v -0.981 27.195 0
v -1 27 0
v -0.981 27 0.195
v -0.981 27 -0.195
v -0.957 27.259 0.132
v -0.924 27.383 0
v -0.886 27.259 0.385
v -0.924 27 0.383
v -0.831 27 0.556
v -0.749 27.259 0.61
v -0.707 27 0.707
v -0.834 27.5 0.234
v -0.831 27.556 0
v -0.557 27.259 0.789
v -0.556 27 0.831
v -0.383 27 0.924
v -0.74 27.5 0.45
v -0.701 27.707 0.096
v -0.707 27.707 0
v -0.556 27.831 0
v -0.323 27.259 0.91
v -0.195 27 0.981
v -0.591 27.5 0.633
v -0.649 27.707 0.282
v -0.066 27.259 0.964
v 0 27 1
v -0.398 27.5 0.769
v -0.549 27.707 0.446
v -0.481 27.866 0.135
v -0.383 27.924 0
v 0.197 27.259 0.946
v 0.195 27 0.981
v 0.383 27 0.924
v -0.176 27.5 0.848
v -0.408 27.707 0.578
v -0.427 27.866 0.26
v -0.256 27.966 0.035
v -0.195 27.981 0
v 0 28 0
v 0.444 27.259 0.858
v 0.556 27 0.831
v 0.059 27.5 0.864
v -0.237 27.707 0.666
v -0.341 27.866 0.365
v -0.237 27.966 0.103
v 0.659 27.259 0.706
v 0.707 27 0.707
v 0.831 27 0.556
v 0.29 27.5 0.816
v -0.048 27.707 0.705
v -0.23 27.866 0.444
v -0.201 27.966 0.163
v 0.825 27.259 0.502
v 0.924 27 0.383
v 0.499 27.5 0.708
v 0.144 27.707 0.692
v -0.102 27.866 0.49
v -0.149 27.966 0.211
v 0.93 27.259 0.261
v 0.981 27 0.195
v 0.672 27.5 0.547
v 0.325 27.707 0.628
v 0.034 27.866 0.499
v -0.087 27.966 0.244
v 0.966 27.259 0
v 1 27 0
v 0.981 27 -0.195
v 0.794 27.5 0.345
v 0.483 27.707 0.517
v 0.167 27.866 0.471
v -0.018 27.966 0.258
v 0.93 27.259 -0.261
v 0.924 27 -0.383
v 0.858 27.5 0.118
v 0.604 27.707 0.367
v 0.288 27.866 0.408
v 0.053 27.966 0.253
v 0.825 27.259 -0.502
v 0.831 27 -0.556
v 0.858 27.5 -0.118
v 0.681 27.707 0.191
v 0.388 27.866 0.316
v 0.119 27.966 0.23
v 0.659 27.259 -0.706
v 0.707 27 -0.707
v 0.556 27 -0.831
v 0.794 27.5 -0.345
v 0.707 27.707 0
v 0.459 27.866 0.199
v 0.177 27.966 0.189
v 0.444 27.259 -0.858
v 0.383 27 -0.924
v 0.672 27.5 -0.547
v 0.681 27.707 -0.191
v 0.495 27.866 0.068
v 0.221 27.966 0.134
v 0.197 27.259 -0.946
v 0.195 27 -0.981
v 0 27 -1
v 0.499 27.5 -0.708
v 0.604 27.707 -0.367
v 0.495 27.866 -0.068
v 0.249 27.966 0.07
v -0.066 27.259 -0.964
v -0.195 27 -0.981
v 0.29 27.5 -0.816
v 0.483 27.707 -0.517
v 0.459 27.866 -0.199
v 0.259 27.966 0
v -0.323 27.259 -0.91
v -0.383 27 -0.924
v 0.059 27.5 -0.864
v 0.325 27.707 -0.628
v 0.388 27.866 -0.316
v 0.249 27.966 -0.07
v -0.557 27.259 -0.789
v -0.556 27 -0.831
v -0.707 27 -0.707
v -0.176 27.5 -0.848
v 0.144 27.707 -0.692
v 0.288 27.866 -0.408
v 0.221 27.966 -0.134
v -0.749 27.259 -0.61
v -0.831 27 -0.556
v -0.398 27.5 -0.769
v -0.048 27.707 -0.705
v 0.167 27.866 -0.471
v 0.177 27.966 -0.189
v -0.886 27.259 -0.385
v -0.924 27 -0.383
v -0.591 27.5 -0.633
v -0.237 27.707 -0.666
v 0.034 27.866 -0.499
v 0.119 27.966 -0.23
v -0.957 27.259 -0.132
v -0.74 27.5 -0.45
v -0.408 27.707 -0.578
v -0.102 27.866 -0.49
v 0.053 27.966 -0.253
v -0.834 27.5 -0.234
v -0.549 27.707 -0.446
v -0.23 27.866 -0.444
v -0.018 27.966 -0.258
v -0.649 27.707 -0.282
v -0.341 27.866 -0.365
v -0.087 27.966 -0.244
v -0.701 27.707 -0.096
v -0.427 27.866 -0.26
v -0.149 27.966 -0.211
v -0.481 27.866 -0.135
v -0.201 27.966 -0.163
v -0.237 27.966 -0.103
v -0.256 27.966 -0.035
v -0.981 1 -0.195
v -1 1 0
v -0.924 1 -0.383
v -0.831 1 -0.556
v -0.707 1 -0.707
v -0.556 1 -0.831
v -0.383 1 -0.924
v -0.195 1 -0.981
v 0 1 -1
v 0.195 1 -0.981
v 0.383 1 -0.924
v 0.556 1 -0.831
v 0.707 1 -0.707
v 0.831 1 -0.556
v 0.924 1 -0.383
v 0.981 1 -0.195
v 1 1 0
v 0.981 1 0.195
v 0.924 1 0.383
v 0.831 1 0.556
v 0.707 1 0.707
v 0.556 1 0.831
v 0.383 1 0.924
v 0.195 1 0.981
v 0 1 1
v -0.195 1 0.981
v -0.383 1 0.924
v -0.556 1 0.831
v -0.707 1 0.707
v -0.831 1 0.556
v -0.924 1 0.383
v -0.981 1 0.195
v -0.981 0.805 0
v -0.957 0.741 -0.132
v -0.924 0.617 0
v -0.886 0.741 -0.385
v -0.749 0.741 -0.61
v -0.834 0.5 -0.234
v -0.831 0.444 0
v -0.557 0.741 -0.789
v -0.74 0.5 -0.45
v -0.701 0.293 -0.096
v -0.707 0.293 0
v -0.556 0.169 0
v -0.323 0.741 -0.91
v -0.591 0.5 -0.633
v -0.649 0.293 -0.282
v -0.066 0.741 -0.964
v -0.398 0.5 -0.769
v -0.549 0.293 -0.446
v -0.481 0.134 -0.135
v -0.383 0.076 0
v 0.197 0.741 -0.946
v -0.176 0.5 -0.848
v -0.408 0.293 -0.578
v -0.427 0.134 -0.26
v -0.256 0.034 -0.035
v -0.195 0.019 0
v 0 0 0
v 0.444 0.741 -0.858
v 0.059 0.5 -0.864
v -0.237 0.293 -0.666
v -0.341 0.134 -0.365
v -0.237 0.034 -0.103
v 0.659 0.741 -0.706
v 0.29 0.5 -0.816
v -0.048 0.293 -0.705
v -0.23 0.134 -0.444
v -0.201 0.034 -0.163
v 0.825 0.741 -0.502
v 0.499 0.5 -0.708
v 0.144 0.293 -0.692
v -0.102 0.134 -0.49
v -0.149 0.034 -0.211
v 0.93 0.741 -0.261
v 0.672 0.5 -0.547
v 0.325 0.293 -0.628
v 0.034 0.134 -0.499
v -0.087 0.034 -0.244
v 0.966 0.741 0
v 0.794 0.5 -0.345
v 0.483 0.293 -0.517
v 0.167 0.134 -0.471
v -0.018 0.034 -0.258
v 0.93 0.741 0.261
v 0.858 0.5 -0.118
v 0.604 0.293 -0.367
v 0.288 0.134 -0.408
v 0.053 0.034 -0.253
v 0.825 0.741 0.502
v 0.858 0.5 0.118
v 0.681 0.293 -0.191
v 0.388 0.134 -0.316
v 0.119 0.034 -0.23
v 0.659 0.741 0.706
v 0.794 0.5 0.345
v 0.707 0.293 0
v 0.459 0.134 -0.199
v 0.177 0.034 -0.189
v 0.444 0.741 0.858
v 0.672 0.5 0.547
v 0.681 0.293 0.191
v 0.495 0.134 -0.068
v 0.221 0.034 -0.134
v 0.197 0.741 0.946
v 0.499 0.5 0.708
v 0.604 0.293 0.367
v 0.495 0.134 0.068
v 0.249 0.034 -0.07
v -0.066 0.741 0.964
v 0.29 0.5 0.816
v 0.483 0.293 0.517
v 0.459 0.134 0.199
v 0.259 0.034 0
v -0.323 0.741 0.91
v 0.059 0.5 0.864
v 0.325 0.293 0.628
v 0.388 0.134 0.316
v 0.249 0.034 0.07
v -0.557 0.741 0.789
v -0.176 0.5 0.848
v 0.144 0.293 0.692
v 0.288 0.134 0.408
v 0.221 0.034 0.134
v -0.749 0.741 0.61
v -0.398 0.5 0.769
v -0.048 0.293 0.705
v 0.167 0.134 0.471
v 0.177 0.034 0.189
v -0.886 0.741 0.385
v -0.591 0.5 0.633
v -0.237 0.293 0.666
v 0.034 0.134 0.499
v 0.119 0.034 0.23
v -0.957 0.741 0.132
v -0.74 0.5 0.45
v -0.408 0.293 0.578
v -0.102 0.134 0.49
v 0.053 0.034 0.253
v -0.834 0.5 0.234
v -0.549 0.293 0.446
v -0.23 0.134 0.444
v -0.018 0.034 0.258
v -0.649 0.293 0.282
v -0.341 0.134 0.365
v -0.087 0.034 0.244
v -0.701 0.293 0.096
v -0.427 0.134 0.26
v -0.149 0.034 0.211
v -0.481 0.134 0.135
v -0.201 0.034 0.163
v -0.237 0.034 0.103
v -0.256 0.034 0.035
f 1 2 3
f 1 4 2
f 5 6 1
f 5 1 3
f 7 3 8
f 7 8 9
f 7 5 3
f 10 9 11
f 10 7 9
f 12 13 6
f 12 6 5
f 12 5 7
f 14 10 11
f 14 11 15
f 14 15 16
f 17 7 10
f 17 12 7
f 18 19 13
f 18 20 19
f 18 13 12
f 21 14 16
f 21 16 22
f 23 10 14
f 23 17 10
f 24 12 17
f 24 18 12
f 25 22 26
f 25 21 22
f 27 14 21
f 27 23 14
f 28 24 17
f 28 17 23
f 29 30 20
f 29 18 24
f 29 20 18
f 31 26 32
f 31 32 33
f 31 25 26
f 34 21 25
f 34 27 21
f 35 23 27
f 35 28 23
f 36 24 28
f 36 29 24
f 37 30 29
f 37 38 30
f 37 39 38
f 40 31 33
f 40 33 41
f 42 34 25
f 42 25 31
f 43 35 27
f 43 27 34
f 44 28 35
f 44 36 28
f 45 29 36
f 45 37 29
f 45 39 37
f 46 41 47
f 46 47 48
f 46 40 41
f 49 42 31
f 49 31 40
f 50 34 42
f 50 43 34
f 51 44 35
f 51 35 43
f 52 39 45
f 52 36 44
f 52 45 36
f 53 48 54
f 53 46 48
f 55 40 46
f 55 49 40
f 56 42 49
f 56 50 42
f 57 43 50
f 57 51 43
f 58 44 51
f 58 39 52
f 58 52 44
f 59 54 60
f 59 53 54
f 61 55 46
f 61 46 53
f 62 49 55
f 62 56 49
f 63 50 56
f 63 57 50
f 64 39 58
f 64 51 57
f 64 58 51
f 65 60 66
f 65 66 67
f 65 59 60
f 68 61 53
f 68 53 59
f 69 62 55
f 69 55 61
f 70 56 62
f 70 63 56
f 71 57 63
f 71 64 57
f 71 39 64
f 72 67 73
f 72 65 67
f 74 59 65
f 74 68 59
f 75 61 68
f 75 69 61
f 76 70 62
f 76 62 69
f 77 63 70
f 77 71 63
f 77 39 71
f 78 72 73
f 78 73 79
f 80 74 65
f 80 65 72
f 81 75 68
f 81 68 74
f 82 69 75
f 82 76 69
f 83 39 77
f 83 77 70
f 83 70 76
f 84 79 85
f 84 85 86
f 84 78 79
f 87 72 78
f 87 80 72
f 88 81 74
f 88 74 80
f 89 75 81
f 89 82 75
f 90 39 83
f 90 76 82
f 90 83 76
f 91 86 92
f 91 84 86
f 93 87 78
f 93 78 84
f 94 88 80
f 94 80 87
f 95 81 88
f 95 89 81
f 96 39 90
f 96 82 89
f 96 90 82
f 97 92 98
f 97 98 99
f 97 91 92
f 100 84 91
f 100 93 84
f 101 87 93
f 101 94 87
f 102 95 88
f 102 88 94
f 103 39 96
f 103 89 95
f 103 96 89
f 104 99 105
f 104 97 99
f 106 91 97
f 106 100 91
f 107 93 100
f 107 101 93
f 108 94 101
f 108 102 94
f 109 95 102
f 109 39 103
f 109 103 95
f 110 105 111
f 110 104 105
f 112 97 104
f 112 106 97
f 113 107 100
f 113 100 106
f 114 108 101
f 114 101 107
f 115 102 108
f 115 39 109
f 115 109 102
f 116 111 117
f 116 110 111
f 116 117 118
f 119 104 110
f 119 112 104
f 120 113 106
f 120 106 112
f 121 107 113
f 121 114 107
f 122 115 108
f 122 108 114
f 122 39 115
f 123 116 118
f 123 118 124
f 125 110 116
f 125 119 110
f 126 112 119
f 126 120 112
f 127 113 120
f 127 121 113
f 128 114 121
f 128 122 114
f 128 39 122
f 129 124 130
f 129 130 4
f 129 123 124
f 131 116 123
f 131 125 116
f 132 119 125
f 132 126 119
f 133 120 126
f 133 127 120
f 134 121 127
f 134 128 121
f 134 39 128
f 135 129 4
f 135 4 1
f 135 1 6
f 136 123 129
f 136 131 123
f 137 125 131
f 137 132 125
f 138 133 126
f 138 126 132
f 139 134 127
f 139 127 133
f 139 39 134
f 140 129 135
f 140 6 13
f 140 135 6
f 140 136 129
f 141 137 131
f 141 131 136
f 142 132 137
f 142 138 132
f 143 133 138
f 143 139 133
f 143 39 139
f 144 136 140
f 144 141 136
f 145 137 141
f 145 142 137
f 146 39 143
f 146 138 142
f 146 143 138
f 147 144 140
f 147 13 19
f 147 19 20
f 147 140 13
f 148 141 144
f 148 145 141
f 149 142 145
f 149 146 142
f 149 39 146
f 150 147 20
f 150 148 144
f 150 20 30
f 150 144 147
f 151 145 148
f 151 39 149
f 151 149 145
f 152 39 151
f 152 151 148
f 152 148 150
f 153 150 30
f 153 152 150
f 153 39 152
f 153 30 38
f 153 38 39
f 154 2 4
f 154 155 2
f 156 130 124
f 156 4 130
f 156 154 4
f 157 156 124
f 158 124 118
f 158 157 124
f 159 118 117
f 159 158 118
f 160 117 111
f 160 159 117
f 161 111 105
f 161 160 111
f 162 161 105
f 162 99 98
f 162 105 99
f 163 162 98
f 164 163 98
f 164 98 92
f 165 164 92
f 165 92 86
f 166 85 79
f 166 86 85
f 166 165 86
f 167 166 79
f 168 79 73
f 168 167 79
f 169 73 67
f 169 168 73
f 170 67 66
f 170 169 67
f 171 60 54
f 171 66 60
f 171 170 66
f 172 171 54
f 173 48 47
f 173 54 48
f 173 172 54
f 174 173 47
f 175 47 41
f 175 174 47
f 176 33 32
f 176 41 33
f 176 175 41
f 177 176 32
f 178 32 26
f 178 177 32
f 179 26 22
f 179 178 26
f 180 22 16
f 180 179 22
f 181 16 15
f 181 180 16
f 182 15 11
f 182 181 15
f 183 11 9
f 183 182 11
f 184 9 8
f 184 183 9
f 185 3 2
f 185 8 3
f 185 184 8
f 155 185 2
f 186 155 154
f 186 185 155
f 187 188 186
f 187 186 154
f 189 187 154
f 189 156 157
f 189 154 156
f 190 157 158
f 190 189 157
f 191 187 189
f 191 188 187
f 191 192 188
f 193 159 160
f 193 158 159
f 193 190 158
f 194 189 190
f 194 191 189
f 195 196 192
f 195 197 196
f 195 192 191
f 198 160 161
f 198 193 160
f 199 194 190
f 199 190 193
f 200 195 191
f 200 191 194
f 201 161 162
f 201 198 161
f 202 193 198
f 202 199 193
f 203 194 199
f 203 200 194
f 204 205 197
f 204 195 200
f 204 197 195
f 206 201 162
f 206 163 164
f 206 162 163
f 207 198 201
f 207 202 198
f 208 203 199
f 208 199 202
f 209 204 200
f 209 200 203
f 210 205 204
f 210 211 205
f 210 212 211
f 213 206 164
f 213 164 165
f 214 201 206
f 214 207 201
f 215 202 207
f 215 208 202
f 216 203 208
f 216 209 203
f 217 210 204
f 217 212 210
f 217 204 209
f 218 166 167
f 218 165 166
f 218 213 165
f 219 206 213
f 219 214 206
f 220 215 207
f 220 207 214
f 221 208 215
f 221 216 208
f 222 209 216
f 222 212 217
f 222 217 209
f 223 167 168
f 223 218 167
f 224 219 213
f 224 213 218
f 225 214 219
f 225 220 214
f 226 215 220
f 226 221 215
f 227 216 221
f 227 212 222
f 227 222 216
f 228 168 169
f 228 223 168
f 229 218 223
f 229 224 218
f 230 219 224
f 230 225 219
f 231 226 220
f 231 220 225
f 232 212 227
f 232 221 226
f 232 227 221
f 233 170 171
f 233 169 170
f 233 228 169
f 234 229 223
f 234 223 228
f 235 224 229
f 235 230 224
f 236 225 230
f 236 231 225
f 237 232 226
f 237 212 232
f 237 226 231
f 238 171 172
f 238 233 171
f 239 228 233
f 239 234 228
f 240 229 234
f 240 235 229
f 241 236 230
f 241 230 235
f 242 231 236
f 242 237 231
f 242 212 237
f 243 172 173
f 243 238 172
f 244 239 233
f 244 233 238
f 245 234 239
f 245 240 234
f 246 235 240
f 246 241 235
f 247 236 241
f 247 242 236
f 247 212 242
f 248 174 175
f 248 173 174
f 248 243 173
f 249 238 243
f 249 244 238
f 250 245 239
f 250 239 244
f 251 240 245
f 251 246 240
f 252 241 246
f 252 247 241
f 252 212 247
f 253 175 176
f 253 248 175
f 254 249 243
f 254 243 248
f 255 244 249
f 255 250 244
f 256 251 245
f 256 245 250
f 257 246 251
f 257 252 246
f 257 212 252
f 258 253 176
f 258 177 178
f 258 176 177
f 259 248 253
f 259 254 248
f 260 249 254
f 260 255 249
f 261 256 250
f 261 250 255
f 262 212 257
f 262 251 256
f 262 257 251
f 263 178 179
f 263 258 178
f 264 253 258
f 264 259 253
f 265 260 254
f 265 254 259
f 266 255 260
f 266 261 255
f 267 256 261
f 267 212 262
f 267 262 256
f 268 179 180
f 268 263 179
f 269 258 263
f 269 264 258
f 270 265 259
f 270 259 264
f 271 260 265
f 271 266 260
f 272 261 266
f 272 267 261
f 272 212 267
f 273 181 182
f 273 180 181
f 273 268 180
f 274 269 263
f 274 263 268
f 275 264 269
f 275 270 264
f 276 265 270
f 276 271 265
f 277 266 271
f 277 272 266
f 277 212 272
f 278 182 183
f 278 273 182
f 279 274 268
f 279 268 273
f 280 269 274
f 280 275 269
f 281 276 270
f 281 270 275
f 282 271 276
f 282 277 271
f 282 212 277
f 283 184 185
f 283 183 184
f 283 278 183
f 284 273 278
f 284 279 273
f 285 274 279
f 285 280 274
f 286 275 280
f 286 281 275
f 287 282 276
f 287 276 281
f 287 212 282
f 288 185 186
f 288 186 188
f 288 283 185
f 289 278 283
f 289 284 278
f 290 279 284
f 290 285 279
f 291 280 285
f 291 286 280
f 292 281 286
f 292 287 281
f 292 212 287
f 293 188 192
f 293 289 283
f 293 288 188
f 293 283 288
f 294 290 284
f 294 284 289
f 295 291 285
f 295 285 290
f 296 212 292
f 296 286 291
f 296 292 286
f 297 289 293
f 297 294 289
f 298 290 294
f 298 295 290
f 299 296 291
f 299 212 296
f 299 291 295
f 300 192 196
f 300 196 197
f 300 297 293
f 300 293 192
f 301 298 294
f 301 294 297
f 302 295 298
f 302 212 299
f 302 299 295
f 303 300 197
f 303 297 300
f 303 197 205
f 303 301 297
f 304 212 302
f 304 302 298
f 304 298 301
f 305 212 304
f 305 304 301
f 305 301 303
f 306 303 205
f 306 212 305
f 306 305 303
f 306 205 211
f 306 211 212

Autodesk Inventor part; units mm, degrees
ref_plane "YZ Plane" through (0, 0, 0) normal (1, 0, 0) x (0, 1, 0)
ref_plane "XZ Plane" through (0, 0, 0) normal (0, 1, 0) x (-1, 0, 0)
ref_plane "XY Plane" through (0, 0, 0) normal (0, 0, 1) x (1, 0, 0)
sketch "Sketch1" plane through (0, 0, 0) normal (0, 1, 0) x (-1, 0, 0)
  circle A0 centre (0, 0) radius 1
  dimension "d0" = 2
extrude "Extrusion1" add sketch "Sketch1" along normal blind 28
fillet "Fillet1" radius 1 1 edges at (1, 28, 0)
fillet "Fillet2" radius 1 1 edges at (1, 0, 0)
properties part number "pin_2_x_28_mm"
